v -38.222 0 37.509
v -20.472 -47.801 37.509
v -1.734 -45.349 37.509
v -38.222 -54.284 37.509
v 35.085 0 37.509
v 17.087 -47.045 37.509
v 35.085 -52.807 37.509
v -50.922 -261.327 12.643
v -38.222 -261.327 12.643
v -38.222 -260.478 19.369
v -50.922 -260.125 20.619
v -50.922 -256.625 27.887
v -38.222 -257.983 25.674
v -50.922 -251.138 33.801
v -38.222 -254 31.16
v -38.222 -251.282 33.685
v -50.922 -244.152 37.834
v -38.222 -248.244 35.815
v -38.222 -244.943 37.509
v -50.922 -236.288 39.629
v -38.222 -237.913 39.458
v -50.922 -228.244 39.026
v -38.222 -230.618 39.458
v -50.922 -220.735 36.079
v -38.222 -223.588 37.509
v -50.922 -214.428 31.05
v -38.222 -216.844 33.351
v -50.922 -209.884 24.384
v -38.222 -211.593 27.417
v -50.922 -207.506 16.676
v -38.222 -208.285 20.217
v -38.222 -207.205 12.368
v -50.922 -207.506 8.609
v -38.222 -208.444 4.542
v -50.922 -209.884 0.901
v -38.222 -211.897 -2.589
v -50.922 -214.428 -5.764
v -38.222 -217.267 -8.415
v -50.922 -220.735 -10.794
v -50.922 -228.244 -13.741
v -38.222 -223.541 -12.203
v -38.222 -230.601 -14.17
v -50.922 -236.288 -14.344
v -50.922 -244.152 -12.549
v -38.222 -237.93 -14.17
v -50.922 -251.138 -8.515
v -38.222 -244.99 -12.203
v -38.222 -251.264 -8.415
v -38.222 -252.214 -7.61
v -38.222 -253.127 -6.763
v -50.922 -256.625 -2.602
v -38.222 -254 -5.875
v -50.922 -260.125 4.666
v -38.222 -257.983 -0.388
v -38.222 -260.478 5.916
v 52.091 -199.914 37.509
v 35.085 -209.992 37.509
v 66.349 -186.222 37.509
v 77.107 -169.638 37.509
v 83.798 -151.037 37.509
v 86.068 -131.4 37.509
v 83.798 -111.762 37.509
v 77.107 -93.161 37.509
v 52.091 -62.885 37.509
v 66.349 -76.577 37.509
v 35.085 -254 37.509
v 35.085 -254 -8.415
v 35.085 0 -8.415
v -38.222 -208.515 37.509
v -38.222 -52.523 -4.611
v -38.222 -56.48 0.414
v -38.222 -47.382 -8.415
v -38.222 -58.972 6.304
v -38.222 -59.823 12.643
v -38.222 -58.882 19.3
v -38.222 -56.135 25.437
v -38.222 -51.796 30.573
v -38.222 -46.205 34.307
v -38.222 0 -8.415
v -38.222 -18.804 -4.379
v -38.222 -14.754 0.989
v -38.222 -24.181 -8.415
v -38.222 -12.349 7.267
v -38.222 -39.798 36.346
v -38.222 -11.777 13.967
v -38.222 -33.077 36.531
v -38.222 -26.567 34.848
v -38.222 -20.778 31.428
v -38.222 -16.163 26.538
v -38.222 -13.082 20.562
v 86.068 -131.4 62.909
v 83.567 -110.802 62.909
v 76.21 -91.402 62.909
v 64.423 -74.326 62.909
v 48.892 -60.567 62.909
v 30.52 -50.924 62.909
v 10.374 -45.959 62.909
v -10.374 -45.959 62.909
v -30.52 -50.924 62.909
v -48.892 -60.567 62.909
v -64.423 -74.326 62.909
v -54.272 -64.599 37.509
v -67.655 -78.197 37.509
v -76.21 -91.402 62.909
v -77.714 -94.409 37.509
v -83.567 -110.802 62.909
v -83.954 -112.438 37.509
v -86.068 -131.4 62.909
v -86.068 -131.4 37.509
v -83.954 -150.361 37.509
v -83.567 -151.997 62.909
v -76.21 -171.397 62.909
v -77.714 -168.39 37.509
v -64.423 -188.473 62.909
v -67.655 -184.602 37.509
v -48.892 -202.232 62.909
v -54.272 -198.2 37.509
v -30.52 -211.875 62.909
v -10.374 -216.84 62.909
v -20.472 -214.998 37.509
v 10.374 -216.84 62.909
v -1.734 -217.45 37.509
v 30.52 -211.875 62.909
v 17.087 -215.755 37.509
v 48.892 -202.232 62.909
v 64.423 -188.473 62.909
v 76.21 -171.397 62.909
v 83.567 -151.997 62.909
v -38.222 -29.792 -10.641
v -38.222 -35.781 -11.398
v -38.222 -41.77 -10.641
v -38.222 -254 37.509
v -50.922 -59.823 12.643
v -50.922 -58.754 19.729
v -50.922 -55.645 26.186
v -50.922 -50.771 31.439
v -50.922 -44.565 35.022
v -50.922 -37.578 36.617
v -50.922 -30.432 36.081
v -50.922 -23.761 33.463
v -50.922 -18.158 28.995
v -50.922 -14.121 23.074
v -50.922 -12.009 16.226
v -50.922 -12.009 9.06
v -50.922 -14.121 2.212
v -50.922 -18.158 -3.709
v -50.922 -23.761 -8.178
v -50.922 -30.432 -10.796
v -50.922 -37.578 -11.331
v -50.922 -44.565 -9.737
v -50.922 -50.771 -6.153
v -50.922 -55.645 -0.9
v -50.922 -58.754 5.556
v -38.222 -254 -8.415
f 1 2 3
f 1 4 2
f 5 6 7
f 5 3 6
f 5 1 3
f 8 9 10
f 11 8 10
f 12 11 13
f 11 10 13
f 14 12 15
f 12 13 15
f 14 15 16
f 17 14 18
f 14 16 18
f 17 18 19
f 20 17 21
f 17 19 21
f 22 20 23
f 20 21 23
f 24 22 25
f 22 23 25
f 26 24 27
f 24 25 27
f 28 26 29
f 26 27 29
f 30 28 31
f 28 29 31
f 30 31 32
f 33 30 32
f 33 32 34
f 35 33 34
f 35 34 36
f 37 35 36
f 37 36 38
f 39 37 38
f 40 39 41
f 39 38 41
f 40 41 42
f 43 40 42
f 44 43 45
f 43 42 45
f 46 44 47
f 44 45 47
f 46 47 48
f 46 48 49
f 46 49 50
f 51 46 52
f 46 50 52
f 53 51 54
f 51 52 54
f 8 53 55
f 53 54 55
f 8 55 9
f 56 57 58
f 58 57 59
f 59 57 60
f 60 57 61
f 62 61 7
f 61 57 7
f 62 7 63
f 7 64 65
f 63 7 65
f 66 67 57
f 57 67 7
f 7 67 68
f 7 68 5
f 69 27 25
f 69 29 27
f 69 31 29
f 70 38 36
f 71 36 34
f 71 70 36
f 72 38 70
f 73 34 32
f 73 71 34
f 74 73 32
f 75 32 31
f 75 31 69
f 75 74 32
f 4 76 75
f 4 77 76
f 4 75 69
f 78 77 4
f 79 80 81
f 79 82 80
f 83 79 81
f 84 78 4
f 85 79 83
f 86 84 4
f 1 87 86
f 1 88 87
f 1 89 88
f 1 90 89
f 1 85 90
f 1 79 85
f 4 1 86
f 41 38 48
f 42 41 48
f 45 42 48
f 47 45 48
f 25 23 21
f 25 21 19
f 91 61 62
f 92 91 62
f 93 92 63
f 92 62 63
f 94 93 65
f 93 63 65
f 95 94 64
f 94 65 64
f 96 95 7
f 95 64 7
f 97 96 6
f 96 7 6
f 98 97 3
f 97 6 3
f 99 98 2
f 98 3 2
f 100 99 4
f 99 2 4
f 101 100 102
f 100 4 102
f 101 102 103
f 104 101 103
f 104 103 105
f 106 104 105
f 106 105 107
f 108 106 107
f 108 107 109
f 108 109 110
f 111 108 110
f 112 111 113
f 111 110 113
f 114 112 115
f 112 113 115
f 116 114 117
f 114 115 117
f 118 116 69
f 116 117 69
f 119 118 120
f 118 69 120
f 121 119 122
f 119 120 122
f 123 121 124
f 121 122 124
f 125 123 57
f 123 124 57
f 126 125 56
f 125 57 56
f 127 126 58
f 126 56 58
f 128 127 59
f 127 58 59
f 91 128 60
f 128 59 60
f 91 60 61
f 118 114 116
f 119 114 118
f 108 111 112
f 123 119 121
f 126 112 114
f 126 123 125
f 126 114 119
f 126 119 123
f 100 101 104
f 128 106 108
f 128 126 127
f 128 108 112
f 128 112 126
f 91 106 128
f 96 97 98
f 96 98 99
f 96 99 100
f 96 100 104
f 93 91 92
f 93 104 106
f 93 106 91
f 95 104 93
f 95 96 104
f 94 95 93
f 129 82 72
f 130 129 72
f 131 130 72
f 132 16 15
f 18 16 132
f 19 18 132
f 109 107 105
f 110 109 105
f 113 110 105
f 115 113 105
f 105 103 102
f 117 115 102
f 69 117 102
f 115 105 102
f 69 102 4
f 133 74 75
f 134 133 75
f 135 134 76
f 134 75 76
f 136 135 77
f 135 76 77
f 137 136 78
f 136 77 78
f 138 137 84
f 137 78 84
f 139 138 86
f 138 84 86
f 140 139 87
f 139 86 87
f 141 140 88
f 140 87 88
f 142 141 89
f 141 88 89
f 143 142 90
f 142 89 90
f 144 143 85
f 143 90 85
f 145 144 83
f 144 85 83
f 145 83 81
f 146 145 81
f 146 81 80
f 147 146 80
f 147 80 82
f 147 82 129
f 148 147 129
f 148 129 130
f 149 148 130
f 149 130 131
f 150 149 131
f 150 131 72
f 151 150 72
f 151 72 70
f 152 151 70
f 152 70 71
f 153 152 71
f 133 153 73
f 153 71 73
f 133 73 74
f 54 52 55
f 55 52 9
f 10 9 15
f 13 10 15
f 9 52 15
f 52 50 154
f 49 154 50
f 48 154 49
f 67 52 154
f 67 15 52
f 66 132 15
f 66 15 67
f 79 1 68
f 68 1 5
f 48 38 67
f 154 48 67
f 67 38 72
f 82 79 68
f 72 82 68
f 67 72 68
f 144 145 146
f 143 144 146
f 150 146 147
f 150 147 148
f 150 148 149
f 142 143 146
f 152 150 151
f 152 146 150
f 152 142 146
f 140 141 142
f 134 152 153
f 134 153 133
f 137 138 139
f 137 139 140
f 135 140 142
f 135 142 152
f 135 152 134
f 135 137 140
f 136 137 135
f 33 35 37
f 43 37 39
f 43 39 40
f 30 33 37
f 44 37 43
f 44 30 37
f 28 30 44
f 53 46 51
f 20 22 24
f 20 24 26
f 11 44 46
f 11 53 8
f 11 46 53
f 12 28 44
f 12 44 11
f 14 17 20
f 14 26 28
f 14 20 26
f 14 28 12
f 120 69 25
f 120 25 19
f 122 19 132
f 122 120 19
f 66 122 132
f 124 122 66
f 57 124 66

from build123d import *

# Parameters (mm, degrees)
F0_W     = 73.3068473637
F0_H     = 45.9237424657
F1_DEPTH = 254
F2_R     = 86.0682803243
F3_DEPTH = 25.4
F4_R     = 27.0619318238
F4_R_2   = 24.0411397983
F5_DEPTH = 12.7


with BuildPart() as f1:
    # F0 (on Front) → F1 (new body)
    with BuildSketch(Plane.XZ):
        with Locations((-1.5688221902, 14.5472721197)):
            Rectangle(F0_W, F0_H)
    extrude(amount=F1_DEPTH)

    # F2 (on face) → F3 (join)
    with BuildSketch(Plane.XY.offset(37.5091433525)):
        with Locations((0, -131.3995718956)):
            Circle(F2_R)
    extrude(amount=F3_DEPTH)

    # F4 (on face) → F5 (join)
    with BuildSketch(Plane(origin=(-38.222245872, 0, 0), x_dir=(0, -1, 0), z_dir=(-1, 0, 0))):
        with Locations((234.2655062675, 12.6427337527)):
            Circle(F4_R)
        with Locations((35.7813984156, 12.6427337527)):
            Circle(F4_R_2)
    extrude(amount=F5_DEPTH)


solid = f1.part
